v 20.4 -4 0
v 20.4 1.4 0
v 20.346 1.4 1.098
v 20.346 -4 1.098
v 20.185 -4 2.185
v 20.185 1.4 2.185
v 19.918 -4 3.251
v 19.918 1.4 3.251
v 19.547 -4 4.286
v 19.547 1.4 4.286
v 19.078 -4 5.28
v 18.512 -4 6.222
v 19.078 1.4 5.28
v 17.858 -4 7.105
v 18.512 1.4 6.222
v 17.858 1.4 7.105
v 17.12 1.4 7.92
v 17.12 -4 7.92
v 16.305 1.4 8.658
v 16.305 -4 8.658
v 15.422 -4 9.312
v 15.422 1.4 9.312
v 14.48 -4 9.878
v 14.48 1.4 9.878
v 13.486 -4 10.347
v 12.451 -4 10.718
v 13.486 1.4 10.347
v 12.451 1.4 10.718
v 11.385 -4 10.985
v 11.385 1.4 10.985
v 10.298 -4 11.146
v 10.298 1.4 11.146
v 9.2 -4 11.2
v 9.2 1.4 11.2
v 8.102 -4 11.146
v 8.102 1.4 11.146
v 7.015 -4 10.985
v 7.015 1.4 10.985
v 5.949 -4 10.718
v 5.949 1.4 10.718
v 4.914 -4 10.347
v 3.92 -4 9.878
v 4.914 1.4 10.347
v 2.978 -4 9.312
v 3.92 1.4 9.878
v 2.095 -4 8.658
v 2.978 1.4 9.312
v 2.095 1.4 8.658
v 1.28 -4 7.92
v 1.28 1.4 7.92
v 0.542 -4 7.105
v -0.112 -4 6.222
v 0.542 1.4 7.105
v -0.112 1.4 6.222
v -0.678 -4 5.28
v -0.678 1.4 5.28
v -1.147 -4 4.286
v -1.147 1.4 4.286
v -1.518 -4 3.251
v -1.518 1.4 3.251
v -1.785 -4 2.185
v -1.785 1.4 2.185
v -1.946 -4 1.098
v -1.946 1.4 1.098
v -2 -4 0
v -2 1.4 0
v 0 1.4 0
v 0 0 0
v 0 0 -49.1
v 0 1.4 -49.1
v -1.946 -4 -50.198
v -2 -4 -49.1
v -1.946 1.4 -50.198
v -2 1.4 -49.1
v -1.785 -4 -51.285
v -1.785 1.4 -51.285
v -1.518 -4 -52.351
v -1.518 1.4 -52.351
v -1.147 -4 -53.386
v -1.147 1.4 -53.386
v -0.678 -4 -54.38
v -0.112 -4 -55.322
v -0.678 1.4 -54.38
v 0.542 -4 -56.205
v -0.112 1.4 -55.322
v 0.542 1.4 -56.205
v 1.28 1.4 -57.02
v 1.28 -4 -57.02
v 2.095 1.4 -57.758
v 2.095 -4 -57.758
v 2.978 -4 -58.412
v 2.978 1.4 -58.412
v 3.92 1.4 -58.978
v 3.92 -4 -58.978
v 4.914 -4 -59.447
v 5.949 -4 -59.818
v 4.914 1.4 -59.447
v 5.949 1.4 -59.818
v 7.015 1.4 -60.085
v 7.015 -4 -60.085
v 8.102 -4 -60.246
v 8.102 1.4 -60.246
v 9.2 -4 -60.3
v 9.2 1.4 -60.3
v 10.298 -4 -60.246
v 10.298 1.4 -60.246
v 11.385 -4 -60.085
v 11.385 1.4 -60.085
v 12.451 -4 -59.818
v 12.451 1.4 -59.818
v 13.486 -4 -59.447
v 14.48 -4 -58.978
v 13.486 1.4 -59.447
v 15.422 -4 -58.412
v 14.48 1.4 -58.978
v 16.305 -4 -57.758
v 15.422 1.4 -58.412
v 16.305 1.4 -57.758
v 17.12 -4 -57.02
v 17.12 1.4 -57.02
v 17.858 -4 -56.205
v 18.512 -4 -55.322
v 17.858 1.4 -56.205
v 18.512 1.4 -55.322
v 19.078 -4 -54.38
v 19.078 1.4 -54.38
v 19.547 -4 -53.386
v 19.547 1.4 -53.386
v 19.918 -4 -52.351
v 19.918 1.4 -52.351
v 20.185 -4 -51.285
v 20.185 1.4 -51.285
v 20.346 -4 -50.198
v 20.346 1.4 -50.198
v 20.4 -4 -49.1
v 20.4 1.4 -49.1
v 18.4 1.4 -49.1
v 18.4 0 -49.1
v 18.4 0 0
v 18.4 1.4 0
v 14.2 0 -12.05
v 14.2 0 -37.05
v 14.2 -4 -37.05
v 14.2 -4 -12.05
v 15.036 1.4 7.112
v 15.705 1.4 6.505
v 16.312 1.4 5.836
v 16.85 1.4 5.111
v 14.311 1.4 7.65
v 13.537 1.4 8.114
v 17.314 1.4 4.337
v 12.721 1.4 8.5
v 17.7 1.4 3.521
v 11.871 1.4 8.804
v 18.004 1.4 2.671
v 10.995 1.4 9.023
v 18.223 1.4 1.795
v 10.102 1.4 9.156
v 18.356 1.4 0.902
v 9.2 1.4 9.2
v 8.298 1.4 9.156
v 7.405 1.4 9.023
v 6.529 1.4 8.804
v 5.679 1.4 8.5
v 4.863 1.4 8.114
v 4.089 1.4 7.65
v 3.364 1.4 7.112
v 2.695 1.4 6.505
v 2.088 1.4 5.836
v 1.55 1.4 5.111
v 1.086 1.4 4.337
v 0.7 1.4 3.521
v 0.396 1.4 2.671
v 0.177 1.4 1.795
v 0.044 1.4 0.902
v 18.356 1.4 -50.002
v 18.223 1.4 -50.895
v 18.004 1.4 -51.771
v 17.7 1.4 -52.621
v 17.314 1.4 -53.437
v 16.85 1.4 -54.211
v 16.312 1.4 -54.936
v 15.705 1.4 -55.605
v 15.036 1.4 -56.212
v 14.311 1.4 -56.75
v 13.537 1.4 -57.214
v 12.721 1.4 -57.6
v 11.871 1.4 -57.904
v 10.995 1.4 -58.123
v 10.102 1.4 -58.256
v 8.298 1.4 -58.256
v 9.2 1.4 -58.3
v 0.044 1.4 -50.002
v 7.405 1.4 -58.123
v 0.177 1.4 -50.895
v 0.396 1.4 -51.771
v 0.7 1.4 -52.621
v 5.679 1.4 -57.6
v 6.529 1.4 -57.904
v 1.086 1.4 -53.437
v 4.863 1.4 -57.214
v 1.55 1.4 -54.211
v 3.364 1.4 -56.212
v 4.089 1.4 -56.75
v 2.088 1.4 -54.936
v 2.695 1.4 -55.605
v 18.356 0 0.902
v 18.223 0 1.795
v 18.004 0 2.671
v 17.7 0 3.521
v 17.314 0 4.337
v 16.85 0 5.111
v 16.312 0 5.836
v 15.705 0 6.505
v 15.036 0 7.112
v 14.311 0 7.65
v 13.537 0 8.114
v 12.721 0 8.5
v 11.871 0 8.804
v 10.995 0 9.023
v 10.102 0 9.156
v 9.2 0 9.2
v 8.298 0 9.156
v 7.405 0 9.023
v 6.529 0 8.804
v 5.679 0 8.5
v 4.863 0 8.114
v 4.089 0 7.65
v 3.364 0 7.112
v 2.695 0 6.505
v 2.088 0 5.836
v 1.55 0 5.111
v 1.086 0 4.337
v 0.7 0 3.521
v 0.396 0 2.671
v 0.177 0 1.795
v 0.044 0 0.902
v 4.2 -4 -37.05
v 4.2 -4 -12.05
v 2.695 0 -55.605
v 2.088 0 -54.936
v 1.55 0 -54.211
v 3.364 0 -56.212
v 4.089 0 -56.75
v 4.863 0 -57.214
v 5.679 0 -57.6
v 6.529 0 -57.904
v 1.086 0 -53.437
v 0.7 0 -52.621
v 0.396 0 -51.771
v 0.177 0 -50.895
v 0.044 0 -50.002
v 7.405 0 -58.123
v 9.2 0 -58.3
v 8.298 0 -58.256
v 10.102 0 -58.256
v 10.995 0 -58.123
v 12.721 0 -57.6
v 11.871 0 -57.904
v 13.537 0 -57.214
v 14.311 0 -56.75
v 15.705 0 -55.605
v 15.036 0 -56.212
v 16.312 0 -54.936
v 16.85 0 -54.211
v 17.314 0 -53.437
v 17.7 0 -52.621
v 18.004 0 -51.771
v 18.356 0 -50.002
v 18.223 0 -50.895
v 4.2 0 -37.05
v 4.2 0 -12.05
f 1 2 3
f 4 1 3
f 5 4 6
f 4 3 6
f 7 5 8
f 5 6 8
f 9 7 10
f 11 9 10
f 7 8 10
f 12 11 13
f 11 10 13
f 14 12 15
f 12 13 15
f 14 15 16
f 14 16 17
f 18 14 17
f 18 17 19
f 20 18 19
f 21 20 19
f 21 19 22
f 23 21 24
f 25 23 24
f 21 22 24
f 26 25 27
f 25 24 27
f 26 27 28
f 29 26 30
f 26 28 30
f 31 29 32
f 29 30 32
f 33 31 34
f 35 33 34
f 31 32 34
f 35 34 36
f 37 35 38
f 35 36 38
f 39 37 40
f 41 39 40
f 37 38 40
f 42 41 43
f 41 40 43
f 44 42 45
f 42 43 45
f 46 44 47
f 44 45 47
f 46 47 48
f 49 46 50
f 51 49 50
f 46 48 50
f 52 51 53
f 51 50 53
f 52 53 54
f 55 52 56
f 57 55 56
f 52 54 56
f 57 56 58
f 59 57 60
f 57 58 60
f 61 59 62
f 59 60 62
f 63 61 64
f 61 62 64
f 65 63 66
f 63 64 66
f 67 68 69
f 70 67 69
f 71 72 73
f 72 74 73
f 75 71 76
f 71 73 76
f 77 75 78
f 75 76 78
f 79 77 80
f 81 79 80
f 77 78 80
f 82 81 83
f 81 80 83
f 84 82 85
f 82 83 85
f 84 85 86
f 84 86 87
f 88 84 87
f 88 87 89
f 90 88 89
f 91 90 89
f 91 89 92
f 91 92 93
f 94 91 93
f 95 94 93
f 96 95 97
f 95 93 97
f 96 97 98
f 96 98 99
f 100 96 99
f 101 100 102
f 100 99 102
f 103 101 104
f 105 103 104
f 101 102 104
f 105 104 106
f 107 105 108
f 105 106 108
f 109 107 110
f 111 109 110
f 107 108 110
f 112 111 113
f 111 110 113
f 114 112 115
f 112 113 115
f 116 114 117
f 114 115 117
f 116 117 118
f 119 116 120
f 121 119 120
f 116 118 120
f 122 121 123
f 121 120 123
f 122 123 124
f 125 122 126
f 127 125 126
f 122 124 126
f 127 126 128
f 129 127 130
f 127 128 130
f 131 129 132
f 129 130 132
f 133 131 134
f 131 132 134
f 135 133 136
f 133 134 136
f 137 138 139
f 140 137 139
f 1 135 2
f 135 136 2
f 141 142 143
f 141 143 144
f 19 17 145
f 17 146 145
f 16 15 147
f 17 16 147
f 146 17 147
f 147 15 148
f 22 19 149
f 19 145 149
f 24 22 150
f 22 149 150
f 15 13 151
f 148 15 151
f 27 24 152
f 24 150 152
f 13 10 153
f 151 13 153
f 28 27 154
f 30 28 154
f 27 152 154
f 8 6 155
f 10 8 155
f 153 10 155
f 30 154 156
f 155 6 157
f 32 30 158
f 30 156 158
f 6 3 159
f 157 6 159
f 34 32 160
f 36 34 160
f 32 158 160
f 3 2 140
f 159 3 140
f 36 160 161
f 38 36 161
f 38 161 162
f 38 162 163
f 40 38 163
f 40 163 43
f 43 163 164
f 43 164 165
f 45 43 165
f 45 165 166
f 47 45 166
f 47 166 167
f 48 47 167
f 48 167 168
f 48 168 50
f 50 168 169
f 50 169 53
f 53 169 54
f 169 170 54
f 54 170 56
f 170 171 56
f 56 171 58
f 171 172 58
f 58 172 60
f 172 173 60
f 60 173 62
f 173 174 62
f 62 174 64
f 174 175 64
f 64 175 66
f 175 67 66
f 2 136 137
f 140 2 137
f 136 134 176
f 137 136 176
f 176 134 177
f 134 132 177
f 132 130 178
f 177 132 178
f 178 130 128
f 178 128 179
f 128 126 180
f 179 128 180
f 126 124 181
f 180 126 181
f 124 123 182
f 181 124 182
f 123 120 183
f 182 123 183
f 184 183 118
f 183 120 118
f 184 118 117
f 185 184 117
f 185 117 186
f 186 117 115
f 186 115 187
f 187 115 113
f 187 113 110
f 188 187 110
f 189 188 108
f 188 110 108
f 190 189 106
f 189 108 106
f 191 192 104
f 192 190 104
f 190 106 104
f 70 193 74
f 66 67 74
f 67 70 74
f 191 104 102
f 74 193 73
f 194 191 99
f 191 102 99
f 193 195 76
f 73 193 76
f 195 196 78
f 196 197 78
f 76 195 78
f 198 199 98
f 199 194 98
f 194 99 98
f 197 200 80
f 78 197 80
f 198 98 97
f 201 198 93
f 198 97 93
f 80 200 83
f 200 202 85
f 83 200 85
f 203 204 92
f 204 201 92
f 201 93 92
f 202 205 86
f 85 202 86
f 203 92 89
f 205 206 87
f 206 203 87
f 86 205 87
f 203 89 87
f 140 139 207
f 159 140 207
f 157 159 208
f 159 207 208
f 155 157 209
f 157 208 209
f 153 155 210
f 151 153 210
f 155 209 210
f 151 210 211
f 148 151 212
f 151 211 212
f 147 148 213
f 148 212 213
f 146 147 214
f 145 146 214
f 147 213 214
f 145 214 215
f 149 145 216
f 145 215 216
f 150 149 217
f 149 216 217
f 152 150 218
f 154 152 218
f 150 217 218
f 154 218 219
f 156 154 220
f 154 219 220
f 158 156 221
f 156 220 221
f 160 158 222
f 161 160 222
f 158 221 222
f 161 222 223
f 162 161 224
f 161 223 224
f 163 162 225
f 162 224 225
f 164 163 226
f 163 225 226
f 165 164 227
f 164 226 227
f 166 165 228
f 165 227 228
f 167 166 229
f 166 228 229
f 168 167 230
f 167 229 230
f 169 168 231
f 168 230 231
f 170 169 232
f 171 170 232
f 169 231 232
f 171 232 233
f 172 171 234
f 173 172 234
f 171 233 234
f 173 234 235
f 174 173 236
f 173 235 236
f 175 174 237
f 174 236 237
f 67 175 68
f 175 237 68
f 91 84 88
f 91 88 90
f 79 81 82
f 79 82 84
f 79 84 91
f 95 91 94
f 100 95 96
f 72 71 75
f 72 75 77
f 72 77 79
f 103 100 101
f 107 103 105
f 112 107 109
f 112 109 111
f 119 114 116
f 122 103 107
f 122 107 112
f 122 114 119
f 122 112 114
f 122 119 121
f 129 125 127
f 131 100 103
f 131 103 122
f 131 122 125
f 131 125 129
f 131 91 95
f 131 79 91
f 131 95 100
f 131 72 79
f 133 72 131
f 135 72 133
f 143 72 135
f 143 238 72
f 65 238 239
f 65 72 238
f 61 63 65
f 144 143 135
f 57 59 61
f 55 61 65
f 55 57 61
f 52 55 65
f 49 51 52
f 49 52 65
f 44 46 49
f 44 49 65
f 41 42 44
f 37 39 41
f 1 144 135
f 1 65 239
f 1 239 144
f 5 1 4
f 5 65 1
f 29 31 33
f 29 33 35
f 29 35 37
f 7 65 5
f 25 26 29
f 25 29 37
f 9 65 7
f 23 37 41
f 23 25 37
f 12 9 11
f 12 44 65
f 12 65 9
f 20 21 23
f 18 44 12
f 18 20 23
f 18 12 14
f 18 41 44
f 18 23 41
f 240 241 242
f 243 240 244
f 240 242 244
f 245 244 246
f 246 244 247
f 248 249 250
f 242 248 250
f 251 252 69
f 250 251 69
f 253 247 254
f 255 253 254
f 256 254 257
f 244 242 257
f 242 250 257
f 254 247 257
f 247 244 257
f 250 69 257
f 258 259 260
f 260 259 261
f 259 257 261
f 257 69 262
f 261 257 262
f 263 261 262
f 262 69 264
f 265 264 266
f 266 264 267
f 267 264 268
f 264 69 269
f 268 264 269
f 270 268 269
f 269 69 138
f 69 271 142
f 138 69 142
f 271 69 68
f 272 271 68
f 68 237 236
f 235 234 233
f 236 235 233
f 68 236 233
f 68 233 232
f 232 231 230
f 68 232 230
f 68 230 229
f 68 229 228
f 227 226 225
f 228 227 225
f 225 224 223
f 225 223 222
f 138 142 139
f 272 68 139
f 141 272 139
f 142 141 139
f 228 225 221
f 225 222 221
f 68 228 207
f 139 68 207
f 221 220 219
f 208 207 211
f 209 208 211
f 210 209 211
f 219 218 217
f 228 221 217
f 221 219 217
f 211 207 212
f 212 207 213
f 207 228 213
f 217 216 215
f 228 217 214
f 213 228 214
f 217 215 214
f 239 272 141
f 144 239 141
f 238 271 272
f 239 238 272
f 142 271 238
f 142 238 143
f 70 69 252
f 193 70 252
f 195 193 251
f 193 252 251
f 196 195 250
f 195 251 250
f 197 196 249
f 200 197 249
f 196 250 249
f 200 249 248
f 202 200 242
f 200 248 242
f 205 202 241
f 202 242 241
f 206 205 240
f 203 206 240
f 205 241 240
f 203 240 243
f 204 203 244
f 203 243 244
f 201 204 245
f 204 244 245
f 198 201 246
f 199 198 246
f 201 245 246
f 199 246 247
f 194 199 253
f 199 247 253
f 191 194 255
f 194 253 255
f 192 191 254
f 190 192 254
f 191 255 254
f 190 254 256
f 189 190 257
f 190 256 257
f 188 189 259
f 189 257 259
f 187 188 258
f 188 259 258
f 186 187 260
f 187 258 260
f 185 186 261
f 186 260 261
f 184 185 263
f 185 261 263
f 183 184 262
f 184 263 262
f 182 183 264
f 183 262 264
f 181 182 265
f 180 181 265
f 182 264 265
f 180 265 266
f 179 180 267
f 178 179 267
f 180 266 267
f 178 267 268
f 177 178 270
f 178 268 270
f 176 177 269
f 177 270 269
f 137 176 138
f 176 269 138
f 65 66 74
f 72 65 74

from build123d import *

# Parameters (mm, degrees)
EXTRUDE_THIN1_DEPTH = 1.4
SKETCH2_W           = 10
SKETCH2_H           = 25
BOSS_EXTRUDE1_DEPTH = 4


with BuildPart() as part:
    # Sketch1 → Extrude-Thin1 (new body)
    with BuildSketch(Plane(origin=(0, 0, 0), x_dir=(1, 0, 0), z_dir=(0, 1, 0))):
        with BuildLine():
            Line((-2, 0), (-2, 49.1))
            ThreePointArc((-2, 49.1), (9.2, 60.3), (20.4, 49.1))
            Line((20.4, 49.1), (20.4, 0))
            ThreePointArc((20.4, 0), (9.2, -11.2), (-2, 0))
        make_face()
        with BuildLine():
            Line((0, 0), (0, 49.1))
            ThreePointArc((0, 49.1), (9.2, 58.3), (18.4, 49.1))
            Line((18.4, 49.1), (18.4, 0))
            ThreePointArc((18.4, 0), (9.2, -9.2), (0, 0))
        make_face(mode=Mode.SUBTRACT)
    extrude(amount=EXTRUDE_THIN1_DEPTH)

    # Sketch2 → Boss-Extrude1 (add)
    with BuildSketch(Plane.XZ):
        with BuildLine():
            Line((-2, 0), (-2, -49.1))
            ThreePointArc((-2, -49.1), (9.2, -60.3), (20.4, -49.1))
            Line((20.4, -49.1), (20.4, 0))
            ThreePointArc((20.4, 0), (9.2, 11.2), (-2, 0))
        make_face()
        with Locations((9.2, -24.55)):
            Rectangle(SKETCH2_W, SKETCH2_H, mode=Mode.SUBTRACT)
    extrude(amount=BOSS_EXTRUDE1_DEPTH)


solid = part.part
